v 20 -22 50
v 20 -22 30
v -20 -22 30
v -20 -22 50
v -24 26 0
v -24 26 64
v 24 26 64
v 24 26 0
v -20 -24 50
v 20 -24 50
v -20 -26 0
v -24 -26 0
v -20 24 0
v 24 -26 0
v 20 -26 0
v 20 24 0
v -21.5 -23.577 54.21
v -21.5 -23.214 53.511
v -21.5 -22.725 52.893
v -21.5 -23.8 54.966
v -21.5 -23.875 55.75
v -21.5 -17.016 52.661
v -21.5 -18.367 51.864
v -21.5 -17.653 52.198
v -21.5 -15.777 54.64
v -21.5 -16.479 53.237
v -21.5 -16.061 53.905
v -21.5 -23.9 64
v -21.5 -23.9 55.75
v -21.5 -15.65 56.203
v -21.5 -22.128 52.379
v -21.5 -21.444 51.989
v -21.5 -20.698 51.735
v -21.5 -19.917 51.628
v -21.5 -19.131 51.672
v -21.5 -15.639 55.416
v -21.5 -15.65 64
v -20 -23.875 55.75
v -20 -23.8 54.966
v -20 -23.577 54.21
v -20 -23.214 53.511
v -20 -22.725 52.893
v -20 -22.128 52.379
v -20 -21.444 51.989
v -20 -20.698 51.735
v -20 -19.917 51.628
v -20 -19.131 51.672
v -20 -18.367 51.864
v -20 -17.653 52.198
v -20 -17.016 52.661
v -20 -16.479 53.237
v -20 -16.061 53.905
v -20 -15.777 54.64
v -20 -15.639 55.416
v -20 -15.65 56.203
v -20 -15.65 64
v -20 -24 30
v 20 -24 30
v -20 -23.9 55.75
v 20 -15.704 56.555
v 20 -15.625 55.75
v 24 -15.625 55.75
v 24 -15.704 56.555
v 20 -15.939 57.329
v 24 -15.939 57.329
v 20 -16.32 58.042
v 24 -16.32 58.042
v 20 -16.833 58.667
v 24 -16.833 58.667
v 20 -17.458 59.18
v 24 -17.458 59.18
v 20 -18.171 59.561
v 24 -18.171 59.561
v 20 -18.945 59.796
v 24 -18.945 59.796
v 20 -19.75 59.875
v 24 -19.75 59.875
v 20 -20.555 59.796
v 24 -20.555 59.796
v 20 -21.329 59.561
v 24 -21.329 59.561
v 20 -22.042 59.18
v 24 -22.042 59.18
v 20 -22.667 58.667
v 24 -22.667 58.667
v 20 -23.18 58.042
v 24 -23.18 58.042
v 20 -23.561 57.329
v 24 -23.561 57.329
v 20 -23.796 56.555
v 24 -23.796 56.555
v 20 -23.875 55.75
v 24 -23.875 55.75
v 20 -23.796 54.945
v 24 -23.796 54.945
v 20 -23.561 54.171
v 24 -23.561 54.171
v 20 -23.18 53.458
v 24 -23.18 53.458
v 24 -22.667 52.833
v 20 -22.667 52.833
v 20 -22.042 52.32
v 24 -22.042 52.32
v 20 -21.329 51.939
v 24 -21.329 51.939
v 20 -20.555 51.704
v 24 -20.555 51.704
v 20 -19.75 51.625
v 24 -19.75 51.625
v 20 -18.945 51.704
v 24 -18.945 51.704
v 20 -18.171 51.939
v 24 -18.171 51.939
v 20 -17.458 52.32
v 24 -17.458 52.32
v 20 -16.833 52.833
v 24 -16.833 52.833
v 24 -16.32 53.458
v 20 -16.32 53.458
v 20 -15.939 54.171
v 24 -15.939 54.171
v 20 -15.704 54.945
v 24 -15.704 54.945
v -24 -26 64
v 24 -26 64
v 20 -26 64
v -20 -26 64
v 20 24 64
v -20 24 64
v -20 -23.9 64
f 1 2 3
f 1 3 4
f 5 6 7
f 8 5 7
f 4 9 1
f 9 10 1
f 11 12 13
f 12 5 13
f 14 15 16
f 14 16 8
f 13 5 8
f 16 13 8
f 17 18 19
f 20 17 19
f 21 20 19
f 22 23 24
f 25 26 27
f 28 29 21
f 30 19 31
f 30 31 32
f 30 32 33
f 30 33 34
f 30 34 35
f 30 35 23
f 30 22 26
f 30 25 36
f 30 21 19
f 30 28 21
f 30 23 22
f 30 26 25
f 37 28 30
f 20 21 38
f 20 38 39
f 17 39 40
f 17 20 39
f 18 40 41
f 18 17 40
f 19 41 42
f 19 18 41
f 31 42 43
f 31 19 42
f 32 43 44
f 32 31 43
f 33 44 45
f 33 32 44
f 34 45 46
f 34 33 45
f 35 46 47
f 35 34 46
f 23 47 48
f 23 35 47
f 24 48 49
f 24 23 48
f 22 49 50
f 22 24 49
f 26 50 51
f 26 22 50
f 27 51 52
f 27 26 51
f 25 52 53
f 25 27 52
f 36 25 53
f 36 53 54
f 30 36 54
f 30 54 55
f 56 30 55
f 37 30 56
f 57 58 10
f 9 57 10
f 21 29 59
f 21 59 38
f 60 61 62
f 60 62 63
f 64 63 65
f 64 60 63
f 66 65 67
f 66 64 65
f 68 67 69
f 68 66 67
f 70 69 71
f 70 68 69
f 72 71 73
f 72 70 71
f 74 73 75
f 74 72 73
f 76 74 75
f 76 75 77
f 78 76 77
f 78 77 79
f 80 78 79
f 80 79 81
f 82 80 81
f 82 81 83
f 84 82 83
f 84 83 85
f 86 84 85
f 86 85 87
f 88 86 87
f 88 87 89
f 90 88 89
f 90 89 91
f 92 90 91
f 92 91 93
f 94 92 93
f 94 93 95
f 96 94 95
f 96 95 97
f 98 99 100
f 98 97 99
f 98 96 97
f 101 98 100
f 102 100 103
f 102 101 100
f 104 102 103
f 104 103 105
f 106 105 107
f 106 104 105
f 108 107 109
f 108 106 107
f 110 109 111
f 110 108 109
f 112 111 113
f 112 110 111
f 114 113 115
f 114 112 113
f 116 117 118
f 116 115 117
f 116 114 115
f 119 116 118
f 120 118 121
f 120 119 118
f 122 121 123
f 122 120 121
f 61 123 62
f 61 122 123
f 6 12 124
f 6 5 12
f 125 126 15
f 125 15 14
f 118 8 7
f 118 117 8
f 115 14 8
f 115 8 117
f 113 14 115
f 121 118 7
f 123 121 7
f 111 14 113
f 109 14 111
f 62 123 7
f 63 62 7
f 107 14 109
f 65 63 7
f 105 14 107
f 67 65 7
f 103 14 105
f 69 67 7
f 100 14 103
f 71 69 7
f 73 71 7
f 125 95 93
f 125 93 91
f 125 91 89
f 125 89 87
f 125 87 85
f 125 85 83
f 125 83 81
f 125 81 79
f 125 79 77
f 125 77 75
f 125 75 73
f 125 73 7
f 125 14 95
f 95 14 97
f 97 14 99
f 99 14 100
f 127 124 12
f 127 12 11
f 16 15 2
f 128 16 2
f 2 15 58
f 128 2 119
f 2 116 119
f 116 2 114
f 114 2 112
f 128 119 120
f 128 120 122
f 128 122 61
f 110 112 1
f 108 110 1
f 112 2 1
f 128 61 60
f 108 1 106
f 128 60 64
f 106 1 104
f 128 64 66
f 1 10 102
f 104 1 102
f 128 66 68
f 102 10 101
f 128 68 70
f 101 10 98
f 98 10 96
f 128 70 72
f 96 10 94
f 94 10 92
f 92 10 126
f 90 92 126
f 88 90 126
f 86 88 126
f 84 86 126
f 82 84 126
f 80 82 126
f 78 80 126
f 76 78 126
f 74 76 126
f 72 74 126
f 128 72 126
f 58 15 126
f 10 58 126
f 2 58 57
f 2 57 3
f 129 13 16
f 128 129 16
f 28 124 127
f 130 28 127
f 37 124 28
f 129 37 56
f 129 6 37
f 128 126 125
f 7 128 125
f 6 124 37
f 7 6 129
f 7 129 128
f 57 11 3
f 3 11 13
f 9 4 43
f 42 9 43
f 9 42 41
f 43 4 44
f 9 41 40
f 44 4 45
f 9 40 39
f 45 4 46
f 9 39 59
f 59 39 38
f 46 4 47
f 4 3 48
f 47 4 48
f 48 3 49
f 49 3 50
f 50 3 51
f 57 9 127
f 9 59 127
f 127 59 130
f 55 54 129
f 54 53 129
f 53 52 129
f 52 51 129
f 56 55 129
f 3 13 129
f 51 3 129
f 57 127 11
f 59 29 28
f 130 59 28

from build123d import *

# Parameters (mm, degrees)
SKETCH026_W      = 8.25
SKETCH026_H      = 20
EXTRUDE031_DEPTH = 10
SKETCH023_R      = 4.125
EXTRUDE028_DEPTH = 60
SKETCH022_W      = 4
SKETCH022_H      = 64
EXTRUDE027_DEPTH = 26
SKETCH025_W      = 2
SKETCH025_H      = 20
EXTRUDE030_DEPTH = 20
SKETCH024_W      = 40
SKETCH024_H      = 64
EXTRUDE029_DEPTH = 2


with BuildPart() as extrude031:
    # Sketch026 (on Sketch) → Extrude031 (new body)
    with BuildSketch(Plane.YZ):
        with Locations((-19.875, 65.75)):
            Rectangle(SKETCH026_W, SKETCH026_H)
    extrude(amount=EXTRUDE031_DEPTH)


with BuildPart() as extrude031_1:
    # Extrude031 placement: moved
    add(extrude031.part.moved(Location((-21.5, 0.1, 0))))


with BuildPart() as fusion010:
    # Sketch023 → Extrude028 (new body)
    with BuildSketch(Plane.YZ):
        with Locations((-19.75, 55.75)):
            Circle(SKETCH023_R)
    extrude(amount=EXTRUDE028_DEPTH)


with BuildPart() as fusion010_1:
    # Extrude028 placement: moved
    add(fusion010.part.moved(Location((-21.5, 0, 0))))

    # Fusion010: union Extrude031
    add(extrude031_1.part)


with BuildPart() as extrude027:
    # Sketch022 → Extrude027 (new body, symmetric)
    with BuildSketch(Plane.XZ):
        with Locations((-22, 32)):
            Rectangle(SKETCH022_W, SKETCH022_H)
        with Locations((22, 32)):
            Rectangle(SKETCH022_W, SKETCH022_H)
    extrude(amount=EXTRUDE027_DEPTH, both=True)


with BuildPart() as extrude030:
    # Sketch025 → Extrude030 (new body, symmetric)
    with BuildSketch(Plane.YZ):
        with Locations((-23, 40)):
            Rectangle(SKETCH025_W, SKETCH025_H)
    extrude(amount=EXTRUDE030_DEPTH, both=True)


with BuildPart() as cut005:
    # Sketch024 → Extrude029 (new body)
    with BuildSketch(Plane.XZ):
        with Locations((0, 32)):
            Rectangle(SKETCH024_W, SKETCH024_H)
    extrude(amount=-EXTRUDE029_DEPTH)


with BuildPart() as cut005_1:
    # Extrude029 placement: moved
    add(cut005.part.moved(Location((0, 24, 0))))

    # Fusion011: union Extrude027, Extrude030
    add(extrude027.part)
    add(extrude030.part)

    # Cut005: cut Fusion010
    add(fusion010_1.part, mode=Mode.SUBTRACT)


solid = cut005_1.part
